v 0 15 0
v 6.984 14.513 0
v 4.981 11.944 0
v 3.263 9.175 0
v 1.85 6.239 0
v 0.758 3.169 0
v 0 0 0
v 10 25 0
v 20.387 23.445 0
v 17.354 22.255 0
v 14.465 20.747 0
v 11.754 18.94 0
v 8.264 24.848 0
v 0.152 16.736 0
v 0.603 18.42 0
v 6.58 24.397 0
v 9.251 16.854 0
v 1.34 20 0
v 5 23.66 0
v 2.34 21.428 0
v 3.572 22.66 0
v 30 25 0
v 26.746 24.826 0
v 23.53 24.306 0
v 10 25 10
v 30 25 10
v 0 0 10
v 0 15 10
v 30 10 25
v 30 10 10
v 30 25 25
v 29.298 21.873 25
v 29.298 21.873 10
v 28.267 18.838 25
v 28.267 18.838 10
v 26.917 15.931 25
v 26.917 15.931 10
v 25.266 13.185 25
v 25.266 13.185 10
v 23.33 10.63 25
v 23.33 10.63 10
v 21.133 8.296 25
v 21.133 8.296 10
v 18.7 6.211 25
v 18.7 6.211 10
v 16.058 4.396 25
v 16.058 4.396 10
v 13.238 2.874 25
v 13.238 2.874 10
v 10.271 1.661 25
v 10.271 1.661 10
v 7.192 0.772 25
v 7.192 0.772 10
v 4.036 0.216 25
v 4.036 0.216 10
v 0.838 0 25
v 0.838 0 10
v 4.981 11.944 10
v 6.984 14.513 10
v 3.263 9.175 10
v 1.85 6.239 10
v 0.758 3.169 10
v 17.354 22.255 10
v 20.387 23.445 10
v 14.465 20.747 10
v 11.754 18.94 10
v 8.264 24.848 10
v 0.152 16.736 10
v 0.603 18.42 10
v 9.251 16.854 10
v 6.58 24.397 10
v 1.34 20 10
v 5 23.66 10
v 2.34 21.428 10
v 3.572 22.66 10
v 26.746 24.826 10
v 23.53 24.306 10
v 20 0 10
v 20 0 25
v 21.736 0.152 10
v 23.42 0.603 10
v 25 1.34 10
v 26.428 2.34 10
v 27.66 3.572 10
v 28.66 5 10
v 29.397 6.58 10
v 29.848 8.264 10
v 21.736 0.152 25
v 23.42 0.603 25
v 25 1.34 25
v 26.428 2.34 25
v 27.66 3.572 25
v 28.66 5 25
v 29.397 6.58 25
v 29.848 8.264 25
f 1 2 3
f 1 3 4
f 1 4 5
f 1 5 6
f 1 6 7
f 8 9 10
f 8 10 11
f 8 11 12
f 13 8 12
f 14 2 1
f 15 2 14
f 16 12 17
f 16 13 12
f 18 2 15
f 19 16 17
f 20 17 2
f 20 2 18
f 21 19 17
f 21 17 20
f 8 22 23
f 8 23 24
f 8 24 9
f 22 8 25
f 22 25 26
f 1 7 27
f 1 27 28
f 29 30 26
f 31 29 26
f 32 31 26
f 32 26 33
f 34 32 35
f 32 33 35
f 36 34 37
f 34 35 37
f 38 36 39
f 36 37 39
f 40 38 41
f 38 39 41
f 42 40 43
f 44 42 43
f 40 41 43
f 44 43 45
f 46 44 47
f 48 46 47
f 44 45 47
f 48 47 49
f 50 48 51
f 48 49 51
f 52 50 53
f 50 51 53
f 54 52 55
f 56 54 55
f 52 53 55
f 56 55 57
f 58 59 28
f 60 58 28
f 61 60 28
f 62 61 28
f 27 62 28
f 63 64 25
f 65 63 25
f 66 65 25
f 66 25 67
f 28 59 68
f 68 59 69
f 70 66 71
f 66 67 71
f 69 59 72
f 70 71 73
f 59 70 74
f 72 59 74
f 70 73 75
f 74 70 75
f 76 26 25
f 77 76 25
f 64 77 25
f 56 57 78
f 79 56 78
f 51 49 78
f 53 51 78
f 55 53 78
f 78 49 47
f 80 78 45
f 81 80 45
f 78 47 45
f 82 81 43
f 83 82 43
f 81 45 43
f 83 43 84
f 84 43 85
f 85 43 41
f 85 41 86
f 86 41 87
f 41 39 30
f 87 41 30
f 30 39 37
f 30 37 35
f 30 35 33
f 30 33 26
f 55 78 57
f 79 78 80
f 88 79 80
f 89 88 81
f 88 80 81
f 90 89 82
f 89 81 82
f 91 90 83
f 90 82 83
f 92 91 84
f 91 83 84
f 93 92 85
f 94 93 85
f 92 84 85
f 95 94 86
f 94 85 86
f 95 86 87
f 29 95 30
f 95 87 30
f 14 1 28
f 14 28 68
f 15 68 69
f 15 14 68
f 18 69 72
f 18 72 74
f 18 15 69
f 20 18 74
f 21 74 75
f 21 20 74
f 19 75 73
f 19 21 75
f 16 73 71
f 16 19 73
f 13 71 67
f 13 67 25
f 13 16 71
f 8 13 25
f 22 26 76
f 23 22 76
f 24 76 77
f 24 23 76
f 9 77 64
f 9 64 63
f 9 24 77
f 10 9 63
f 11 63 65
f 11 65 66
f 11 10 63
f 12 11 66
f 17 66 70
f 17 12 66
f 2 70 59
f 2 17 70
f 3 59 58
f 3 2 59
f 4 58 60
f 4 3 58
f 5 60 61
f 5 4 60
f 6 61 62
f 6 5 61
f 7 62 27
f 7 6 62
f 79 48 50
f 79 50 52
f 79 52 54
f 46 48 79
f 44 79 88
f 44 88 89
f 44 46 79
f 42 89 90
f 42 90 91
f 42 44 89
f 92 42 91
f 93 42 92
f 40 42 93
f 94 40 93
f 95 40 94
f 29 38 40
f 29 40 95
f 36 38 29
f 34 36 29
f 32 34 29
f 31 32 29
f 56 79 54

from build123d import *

# Parameters (mm, degrees)
BOSS_EXTRUDE3_DEPTH = 10
BOSS_EXTRUDE4_DEPTH = 15


with BuildPart() as part:
    # Sketch1 → Boss-Extrude3 (new body)
    with BuildSketch(Plane.XY):
        with BuildLine():
            Line((10, 25), (30, 25))
            ThreePointArc((30, 25), (10.47437581, 17.930749028), (0, 0))
            Line((0, 0), (0, 15))
            ThreePointArc((0, 15), (2.928932188, 22.071067812), (10, 25))
        make_face()
    extrude(amount=BOSS_EXTRUDE3_DEPTH)


with BuildPart() as body_2:
    # Sketch4 → Boss-Extrude4 (new body)
    with BuildSketch(Plane.XY.offset(10)):
        with BuildLine():
            ThreePointArc((30, 25), (19.944730561, 7.220988407), (0.838212742, 0))
            Line((0.838212742, 0), (20, 0))
            ThreePointArc((20, 0), (27.071067812, 2.928932188), (30, 10))
            Line((30, 10), (30, 25))
        make_face()
    extrude(amount=BOSS_EXTRUDE4_DEPTH)


solid = Compound([part.part, body_2.part])
